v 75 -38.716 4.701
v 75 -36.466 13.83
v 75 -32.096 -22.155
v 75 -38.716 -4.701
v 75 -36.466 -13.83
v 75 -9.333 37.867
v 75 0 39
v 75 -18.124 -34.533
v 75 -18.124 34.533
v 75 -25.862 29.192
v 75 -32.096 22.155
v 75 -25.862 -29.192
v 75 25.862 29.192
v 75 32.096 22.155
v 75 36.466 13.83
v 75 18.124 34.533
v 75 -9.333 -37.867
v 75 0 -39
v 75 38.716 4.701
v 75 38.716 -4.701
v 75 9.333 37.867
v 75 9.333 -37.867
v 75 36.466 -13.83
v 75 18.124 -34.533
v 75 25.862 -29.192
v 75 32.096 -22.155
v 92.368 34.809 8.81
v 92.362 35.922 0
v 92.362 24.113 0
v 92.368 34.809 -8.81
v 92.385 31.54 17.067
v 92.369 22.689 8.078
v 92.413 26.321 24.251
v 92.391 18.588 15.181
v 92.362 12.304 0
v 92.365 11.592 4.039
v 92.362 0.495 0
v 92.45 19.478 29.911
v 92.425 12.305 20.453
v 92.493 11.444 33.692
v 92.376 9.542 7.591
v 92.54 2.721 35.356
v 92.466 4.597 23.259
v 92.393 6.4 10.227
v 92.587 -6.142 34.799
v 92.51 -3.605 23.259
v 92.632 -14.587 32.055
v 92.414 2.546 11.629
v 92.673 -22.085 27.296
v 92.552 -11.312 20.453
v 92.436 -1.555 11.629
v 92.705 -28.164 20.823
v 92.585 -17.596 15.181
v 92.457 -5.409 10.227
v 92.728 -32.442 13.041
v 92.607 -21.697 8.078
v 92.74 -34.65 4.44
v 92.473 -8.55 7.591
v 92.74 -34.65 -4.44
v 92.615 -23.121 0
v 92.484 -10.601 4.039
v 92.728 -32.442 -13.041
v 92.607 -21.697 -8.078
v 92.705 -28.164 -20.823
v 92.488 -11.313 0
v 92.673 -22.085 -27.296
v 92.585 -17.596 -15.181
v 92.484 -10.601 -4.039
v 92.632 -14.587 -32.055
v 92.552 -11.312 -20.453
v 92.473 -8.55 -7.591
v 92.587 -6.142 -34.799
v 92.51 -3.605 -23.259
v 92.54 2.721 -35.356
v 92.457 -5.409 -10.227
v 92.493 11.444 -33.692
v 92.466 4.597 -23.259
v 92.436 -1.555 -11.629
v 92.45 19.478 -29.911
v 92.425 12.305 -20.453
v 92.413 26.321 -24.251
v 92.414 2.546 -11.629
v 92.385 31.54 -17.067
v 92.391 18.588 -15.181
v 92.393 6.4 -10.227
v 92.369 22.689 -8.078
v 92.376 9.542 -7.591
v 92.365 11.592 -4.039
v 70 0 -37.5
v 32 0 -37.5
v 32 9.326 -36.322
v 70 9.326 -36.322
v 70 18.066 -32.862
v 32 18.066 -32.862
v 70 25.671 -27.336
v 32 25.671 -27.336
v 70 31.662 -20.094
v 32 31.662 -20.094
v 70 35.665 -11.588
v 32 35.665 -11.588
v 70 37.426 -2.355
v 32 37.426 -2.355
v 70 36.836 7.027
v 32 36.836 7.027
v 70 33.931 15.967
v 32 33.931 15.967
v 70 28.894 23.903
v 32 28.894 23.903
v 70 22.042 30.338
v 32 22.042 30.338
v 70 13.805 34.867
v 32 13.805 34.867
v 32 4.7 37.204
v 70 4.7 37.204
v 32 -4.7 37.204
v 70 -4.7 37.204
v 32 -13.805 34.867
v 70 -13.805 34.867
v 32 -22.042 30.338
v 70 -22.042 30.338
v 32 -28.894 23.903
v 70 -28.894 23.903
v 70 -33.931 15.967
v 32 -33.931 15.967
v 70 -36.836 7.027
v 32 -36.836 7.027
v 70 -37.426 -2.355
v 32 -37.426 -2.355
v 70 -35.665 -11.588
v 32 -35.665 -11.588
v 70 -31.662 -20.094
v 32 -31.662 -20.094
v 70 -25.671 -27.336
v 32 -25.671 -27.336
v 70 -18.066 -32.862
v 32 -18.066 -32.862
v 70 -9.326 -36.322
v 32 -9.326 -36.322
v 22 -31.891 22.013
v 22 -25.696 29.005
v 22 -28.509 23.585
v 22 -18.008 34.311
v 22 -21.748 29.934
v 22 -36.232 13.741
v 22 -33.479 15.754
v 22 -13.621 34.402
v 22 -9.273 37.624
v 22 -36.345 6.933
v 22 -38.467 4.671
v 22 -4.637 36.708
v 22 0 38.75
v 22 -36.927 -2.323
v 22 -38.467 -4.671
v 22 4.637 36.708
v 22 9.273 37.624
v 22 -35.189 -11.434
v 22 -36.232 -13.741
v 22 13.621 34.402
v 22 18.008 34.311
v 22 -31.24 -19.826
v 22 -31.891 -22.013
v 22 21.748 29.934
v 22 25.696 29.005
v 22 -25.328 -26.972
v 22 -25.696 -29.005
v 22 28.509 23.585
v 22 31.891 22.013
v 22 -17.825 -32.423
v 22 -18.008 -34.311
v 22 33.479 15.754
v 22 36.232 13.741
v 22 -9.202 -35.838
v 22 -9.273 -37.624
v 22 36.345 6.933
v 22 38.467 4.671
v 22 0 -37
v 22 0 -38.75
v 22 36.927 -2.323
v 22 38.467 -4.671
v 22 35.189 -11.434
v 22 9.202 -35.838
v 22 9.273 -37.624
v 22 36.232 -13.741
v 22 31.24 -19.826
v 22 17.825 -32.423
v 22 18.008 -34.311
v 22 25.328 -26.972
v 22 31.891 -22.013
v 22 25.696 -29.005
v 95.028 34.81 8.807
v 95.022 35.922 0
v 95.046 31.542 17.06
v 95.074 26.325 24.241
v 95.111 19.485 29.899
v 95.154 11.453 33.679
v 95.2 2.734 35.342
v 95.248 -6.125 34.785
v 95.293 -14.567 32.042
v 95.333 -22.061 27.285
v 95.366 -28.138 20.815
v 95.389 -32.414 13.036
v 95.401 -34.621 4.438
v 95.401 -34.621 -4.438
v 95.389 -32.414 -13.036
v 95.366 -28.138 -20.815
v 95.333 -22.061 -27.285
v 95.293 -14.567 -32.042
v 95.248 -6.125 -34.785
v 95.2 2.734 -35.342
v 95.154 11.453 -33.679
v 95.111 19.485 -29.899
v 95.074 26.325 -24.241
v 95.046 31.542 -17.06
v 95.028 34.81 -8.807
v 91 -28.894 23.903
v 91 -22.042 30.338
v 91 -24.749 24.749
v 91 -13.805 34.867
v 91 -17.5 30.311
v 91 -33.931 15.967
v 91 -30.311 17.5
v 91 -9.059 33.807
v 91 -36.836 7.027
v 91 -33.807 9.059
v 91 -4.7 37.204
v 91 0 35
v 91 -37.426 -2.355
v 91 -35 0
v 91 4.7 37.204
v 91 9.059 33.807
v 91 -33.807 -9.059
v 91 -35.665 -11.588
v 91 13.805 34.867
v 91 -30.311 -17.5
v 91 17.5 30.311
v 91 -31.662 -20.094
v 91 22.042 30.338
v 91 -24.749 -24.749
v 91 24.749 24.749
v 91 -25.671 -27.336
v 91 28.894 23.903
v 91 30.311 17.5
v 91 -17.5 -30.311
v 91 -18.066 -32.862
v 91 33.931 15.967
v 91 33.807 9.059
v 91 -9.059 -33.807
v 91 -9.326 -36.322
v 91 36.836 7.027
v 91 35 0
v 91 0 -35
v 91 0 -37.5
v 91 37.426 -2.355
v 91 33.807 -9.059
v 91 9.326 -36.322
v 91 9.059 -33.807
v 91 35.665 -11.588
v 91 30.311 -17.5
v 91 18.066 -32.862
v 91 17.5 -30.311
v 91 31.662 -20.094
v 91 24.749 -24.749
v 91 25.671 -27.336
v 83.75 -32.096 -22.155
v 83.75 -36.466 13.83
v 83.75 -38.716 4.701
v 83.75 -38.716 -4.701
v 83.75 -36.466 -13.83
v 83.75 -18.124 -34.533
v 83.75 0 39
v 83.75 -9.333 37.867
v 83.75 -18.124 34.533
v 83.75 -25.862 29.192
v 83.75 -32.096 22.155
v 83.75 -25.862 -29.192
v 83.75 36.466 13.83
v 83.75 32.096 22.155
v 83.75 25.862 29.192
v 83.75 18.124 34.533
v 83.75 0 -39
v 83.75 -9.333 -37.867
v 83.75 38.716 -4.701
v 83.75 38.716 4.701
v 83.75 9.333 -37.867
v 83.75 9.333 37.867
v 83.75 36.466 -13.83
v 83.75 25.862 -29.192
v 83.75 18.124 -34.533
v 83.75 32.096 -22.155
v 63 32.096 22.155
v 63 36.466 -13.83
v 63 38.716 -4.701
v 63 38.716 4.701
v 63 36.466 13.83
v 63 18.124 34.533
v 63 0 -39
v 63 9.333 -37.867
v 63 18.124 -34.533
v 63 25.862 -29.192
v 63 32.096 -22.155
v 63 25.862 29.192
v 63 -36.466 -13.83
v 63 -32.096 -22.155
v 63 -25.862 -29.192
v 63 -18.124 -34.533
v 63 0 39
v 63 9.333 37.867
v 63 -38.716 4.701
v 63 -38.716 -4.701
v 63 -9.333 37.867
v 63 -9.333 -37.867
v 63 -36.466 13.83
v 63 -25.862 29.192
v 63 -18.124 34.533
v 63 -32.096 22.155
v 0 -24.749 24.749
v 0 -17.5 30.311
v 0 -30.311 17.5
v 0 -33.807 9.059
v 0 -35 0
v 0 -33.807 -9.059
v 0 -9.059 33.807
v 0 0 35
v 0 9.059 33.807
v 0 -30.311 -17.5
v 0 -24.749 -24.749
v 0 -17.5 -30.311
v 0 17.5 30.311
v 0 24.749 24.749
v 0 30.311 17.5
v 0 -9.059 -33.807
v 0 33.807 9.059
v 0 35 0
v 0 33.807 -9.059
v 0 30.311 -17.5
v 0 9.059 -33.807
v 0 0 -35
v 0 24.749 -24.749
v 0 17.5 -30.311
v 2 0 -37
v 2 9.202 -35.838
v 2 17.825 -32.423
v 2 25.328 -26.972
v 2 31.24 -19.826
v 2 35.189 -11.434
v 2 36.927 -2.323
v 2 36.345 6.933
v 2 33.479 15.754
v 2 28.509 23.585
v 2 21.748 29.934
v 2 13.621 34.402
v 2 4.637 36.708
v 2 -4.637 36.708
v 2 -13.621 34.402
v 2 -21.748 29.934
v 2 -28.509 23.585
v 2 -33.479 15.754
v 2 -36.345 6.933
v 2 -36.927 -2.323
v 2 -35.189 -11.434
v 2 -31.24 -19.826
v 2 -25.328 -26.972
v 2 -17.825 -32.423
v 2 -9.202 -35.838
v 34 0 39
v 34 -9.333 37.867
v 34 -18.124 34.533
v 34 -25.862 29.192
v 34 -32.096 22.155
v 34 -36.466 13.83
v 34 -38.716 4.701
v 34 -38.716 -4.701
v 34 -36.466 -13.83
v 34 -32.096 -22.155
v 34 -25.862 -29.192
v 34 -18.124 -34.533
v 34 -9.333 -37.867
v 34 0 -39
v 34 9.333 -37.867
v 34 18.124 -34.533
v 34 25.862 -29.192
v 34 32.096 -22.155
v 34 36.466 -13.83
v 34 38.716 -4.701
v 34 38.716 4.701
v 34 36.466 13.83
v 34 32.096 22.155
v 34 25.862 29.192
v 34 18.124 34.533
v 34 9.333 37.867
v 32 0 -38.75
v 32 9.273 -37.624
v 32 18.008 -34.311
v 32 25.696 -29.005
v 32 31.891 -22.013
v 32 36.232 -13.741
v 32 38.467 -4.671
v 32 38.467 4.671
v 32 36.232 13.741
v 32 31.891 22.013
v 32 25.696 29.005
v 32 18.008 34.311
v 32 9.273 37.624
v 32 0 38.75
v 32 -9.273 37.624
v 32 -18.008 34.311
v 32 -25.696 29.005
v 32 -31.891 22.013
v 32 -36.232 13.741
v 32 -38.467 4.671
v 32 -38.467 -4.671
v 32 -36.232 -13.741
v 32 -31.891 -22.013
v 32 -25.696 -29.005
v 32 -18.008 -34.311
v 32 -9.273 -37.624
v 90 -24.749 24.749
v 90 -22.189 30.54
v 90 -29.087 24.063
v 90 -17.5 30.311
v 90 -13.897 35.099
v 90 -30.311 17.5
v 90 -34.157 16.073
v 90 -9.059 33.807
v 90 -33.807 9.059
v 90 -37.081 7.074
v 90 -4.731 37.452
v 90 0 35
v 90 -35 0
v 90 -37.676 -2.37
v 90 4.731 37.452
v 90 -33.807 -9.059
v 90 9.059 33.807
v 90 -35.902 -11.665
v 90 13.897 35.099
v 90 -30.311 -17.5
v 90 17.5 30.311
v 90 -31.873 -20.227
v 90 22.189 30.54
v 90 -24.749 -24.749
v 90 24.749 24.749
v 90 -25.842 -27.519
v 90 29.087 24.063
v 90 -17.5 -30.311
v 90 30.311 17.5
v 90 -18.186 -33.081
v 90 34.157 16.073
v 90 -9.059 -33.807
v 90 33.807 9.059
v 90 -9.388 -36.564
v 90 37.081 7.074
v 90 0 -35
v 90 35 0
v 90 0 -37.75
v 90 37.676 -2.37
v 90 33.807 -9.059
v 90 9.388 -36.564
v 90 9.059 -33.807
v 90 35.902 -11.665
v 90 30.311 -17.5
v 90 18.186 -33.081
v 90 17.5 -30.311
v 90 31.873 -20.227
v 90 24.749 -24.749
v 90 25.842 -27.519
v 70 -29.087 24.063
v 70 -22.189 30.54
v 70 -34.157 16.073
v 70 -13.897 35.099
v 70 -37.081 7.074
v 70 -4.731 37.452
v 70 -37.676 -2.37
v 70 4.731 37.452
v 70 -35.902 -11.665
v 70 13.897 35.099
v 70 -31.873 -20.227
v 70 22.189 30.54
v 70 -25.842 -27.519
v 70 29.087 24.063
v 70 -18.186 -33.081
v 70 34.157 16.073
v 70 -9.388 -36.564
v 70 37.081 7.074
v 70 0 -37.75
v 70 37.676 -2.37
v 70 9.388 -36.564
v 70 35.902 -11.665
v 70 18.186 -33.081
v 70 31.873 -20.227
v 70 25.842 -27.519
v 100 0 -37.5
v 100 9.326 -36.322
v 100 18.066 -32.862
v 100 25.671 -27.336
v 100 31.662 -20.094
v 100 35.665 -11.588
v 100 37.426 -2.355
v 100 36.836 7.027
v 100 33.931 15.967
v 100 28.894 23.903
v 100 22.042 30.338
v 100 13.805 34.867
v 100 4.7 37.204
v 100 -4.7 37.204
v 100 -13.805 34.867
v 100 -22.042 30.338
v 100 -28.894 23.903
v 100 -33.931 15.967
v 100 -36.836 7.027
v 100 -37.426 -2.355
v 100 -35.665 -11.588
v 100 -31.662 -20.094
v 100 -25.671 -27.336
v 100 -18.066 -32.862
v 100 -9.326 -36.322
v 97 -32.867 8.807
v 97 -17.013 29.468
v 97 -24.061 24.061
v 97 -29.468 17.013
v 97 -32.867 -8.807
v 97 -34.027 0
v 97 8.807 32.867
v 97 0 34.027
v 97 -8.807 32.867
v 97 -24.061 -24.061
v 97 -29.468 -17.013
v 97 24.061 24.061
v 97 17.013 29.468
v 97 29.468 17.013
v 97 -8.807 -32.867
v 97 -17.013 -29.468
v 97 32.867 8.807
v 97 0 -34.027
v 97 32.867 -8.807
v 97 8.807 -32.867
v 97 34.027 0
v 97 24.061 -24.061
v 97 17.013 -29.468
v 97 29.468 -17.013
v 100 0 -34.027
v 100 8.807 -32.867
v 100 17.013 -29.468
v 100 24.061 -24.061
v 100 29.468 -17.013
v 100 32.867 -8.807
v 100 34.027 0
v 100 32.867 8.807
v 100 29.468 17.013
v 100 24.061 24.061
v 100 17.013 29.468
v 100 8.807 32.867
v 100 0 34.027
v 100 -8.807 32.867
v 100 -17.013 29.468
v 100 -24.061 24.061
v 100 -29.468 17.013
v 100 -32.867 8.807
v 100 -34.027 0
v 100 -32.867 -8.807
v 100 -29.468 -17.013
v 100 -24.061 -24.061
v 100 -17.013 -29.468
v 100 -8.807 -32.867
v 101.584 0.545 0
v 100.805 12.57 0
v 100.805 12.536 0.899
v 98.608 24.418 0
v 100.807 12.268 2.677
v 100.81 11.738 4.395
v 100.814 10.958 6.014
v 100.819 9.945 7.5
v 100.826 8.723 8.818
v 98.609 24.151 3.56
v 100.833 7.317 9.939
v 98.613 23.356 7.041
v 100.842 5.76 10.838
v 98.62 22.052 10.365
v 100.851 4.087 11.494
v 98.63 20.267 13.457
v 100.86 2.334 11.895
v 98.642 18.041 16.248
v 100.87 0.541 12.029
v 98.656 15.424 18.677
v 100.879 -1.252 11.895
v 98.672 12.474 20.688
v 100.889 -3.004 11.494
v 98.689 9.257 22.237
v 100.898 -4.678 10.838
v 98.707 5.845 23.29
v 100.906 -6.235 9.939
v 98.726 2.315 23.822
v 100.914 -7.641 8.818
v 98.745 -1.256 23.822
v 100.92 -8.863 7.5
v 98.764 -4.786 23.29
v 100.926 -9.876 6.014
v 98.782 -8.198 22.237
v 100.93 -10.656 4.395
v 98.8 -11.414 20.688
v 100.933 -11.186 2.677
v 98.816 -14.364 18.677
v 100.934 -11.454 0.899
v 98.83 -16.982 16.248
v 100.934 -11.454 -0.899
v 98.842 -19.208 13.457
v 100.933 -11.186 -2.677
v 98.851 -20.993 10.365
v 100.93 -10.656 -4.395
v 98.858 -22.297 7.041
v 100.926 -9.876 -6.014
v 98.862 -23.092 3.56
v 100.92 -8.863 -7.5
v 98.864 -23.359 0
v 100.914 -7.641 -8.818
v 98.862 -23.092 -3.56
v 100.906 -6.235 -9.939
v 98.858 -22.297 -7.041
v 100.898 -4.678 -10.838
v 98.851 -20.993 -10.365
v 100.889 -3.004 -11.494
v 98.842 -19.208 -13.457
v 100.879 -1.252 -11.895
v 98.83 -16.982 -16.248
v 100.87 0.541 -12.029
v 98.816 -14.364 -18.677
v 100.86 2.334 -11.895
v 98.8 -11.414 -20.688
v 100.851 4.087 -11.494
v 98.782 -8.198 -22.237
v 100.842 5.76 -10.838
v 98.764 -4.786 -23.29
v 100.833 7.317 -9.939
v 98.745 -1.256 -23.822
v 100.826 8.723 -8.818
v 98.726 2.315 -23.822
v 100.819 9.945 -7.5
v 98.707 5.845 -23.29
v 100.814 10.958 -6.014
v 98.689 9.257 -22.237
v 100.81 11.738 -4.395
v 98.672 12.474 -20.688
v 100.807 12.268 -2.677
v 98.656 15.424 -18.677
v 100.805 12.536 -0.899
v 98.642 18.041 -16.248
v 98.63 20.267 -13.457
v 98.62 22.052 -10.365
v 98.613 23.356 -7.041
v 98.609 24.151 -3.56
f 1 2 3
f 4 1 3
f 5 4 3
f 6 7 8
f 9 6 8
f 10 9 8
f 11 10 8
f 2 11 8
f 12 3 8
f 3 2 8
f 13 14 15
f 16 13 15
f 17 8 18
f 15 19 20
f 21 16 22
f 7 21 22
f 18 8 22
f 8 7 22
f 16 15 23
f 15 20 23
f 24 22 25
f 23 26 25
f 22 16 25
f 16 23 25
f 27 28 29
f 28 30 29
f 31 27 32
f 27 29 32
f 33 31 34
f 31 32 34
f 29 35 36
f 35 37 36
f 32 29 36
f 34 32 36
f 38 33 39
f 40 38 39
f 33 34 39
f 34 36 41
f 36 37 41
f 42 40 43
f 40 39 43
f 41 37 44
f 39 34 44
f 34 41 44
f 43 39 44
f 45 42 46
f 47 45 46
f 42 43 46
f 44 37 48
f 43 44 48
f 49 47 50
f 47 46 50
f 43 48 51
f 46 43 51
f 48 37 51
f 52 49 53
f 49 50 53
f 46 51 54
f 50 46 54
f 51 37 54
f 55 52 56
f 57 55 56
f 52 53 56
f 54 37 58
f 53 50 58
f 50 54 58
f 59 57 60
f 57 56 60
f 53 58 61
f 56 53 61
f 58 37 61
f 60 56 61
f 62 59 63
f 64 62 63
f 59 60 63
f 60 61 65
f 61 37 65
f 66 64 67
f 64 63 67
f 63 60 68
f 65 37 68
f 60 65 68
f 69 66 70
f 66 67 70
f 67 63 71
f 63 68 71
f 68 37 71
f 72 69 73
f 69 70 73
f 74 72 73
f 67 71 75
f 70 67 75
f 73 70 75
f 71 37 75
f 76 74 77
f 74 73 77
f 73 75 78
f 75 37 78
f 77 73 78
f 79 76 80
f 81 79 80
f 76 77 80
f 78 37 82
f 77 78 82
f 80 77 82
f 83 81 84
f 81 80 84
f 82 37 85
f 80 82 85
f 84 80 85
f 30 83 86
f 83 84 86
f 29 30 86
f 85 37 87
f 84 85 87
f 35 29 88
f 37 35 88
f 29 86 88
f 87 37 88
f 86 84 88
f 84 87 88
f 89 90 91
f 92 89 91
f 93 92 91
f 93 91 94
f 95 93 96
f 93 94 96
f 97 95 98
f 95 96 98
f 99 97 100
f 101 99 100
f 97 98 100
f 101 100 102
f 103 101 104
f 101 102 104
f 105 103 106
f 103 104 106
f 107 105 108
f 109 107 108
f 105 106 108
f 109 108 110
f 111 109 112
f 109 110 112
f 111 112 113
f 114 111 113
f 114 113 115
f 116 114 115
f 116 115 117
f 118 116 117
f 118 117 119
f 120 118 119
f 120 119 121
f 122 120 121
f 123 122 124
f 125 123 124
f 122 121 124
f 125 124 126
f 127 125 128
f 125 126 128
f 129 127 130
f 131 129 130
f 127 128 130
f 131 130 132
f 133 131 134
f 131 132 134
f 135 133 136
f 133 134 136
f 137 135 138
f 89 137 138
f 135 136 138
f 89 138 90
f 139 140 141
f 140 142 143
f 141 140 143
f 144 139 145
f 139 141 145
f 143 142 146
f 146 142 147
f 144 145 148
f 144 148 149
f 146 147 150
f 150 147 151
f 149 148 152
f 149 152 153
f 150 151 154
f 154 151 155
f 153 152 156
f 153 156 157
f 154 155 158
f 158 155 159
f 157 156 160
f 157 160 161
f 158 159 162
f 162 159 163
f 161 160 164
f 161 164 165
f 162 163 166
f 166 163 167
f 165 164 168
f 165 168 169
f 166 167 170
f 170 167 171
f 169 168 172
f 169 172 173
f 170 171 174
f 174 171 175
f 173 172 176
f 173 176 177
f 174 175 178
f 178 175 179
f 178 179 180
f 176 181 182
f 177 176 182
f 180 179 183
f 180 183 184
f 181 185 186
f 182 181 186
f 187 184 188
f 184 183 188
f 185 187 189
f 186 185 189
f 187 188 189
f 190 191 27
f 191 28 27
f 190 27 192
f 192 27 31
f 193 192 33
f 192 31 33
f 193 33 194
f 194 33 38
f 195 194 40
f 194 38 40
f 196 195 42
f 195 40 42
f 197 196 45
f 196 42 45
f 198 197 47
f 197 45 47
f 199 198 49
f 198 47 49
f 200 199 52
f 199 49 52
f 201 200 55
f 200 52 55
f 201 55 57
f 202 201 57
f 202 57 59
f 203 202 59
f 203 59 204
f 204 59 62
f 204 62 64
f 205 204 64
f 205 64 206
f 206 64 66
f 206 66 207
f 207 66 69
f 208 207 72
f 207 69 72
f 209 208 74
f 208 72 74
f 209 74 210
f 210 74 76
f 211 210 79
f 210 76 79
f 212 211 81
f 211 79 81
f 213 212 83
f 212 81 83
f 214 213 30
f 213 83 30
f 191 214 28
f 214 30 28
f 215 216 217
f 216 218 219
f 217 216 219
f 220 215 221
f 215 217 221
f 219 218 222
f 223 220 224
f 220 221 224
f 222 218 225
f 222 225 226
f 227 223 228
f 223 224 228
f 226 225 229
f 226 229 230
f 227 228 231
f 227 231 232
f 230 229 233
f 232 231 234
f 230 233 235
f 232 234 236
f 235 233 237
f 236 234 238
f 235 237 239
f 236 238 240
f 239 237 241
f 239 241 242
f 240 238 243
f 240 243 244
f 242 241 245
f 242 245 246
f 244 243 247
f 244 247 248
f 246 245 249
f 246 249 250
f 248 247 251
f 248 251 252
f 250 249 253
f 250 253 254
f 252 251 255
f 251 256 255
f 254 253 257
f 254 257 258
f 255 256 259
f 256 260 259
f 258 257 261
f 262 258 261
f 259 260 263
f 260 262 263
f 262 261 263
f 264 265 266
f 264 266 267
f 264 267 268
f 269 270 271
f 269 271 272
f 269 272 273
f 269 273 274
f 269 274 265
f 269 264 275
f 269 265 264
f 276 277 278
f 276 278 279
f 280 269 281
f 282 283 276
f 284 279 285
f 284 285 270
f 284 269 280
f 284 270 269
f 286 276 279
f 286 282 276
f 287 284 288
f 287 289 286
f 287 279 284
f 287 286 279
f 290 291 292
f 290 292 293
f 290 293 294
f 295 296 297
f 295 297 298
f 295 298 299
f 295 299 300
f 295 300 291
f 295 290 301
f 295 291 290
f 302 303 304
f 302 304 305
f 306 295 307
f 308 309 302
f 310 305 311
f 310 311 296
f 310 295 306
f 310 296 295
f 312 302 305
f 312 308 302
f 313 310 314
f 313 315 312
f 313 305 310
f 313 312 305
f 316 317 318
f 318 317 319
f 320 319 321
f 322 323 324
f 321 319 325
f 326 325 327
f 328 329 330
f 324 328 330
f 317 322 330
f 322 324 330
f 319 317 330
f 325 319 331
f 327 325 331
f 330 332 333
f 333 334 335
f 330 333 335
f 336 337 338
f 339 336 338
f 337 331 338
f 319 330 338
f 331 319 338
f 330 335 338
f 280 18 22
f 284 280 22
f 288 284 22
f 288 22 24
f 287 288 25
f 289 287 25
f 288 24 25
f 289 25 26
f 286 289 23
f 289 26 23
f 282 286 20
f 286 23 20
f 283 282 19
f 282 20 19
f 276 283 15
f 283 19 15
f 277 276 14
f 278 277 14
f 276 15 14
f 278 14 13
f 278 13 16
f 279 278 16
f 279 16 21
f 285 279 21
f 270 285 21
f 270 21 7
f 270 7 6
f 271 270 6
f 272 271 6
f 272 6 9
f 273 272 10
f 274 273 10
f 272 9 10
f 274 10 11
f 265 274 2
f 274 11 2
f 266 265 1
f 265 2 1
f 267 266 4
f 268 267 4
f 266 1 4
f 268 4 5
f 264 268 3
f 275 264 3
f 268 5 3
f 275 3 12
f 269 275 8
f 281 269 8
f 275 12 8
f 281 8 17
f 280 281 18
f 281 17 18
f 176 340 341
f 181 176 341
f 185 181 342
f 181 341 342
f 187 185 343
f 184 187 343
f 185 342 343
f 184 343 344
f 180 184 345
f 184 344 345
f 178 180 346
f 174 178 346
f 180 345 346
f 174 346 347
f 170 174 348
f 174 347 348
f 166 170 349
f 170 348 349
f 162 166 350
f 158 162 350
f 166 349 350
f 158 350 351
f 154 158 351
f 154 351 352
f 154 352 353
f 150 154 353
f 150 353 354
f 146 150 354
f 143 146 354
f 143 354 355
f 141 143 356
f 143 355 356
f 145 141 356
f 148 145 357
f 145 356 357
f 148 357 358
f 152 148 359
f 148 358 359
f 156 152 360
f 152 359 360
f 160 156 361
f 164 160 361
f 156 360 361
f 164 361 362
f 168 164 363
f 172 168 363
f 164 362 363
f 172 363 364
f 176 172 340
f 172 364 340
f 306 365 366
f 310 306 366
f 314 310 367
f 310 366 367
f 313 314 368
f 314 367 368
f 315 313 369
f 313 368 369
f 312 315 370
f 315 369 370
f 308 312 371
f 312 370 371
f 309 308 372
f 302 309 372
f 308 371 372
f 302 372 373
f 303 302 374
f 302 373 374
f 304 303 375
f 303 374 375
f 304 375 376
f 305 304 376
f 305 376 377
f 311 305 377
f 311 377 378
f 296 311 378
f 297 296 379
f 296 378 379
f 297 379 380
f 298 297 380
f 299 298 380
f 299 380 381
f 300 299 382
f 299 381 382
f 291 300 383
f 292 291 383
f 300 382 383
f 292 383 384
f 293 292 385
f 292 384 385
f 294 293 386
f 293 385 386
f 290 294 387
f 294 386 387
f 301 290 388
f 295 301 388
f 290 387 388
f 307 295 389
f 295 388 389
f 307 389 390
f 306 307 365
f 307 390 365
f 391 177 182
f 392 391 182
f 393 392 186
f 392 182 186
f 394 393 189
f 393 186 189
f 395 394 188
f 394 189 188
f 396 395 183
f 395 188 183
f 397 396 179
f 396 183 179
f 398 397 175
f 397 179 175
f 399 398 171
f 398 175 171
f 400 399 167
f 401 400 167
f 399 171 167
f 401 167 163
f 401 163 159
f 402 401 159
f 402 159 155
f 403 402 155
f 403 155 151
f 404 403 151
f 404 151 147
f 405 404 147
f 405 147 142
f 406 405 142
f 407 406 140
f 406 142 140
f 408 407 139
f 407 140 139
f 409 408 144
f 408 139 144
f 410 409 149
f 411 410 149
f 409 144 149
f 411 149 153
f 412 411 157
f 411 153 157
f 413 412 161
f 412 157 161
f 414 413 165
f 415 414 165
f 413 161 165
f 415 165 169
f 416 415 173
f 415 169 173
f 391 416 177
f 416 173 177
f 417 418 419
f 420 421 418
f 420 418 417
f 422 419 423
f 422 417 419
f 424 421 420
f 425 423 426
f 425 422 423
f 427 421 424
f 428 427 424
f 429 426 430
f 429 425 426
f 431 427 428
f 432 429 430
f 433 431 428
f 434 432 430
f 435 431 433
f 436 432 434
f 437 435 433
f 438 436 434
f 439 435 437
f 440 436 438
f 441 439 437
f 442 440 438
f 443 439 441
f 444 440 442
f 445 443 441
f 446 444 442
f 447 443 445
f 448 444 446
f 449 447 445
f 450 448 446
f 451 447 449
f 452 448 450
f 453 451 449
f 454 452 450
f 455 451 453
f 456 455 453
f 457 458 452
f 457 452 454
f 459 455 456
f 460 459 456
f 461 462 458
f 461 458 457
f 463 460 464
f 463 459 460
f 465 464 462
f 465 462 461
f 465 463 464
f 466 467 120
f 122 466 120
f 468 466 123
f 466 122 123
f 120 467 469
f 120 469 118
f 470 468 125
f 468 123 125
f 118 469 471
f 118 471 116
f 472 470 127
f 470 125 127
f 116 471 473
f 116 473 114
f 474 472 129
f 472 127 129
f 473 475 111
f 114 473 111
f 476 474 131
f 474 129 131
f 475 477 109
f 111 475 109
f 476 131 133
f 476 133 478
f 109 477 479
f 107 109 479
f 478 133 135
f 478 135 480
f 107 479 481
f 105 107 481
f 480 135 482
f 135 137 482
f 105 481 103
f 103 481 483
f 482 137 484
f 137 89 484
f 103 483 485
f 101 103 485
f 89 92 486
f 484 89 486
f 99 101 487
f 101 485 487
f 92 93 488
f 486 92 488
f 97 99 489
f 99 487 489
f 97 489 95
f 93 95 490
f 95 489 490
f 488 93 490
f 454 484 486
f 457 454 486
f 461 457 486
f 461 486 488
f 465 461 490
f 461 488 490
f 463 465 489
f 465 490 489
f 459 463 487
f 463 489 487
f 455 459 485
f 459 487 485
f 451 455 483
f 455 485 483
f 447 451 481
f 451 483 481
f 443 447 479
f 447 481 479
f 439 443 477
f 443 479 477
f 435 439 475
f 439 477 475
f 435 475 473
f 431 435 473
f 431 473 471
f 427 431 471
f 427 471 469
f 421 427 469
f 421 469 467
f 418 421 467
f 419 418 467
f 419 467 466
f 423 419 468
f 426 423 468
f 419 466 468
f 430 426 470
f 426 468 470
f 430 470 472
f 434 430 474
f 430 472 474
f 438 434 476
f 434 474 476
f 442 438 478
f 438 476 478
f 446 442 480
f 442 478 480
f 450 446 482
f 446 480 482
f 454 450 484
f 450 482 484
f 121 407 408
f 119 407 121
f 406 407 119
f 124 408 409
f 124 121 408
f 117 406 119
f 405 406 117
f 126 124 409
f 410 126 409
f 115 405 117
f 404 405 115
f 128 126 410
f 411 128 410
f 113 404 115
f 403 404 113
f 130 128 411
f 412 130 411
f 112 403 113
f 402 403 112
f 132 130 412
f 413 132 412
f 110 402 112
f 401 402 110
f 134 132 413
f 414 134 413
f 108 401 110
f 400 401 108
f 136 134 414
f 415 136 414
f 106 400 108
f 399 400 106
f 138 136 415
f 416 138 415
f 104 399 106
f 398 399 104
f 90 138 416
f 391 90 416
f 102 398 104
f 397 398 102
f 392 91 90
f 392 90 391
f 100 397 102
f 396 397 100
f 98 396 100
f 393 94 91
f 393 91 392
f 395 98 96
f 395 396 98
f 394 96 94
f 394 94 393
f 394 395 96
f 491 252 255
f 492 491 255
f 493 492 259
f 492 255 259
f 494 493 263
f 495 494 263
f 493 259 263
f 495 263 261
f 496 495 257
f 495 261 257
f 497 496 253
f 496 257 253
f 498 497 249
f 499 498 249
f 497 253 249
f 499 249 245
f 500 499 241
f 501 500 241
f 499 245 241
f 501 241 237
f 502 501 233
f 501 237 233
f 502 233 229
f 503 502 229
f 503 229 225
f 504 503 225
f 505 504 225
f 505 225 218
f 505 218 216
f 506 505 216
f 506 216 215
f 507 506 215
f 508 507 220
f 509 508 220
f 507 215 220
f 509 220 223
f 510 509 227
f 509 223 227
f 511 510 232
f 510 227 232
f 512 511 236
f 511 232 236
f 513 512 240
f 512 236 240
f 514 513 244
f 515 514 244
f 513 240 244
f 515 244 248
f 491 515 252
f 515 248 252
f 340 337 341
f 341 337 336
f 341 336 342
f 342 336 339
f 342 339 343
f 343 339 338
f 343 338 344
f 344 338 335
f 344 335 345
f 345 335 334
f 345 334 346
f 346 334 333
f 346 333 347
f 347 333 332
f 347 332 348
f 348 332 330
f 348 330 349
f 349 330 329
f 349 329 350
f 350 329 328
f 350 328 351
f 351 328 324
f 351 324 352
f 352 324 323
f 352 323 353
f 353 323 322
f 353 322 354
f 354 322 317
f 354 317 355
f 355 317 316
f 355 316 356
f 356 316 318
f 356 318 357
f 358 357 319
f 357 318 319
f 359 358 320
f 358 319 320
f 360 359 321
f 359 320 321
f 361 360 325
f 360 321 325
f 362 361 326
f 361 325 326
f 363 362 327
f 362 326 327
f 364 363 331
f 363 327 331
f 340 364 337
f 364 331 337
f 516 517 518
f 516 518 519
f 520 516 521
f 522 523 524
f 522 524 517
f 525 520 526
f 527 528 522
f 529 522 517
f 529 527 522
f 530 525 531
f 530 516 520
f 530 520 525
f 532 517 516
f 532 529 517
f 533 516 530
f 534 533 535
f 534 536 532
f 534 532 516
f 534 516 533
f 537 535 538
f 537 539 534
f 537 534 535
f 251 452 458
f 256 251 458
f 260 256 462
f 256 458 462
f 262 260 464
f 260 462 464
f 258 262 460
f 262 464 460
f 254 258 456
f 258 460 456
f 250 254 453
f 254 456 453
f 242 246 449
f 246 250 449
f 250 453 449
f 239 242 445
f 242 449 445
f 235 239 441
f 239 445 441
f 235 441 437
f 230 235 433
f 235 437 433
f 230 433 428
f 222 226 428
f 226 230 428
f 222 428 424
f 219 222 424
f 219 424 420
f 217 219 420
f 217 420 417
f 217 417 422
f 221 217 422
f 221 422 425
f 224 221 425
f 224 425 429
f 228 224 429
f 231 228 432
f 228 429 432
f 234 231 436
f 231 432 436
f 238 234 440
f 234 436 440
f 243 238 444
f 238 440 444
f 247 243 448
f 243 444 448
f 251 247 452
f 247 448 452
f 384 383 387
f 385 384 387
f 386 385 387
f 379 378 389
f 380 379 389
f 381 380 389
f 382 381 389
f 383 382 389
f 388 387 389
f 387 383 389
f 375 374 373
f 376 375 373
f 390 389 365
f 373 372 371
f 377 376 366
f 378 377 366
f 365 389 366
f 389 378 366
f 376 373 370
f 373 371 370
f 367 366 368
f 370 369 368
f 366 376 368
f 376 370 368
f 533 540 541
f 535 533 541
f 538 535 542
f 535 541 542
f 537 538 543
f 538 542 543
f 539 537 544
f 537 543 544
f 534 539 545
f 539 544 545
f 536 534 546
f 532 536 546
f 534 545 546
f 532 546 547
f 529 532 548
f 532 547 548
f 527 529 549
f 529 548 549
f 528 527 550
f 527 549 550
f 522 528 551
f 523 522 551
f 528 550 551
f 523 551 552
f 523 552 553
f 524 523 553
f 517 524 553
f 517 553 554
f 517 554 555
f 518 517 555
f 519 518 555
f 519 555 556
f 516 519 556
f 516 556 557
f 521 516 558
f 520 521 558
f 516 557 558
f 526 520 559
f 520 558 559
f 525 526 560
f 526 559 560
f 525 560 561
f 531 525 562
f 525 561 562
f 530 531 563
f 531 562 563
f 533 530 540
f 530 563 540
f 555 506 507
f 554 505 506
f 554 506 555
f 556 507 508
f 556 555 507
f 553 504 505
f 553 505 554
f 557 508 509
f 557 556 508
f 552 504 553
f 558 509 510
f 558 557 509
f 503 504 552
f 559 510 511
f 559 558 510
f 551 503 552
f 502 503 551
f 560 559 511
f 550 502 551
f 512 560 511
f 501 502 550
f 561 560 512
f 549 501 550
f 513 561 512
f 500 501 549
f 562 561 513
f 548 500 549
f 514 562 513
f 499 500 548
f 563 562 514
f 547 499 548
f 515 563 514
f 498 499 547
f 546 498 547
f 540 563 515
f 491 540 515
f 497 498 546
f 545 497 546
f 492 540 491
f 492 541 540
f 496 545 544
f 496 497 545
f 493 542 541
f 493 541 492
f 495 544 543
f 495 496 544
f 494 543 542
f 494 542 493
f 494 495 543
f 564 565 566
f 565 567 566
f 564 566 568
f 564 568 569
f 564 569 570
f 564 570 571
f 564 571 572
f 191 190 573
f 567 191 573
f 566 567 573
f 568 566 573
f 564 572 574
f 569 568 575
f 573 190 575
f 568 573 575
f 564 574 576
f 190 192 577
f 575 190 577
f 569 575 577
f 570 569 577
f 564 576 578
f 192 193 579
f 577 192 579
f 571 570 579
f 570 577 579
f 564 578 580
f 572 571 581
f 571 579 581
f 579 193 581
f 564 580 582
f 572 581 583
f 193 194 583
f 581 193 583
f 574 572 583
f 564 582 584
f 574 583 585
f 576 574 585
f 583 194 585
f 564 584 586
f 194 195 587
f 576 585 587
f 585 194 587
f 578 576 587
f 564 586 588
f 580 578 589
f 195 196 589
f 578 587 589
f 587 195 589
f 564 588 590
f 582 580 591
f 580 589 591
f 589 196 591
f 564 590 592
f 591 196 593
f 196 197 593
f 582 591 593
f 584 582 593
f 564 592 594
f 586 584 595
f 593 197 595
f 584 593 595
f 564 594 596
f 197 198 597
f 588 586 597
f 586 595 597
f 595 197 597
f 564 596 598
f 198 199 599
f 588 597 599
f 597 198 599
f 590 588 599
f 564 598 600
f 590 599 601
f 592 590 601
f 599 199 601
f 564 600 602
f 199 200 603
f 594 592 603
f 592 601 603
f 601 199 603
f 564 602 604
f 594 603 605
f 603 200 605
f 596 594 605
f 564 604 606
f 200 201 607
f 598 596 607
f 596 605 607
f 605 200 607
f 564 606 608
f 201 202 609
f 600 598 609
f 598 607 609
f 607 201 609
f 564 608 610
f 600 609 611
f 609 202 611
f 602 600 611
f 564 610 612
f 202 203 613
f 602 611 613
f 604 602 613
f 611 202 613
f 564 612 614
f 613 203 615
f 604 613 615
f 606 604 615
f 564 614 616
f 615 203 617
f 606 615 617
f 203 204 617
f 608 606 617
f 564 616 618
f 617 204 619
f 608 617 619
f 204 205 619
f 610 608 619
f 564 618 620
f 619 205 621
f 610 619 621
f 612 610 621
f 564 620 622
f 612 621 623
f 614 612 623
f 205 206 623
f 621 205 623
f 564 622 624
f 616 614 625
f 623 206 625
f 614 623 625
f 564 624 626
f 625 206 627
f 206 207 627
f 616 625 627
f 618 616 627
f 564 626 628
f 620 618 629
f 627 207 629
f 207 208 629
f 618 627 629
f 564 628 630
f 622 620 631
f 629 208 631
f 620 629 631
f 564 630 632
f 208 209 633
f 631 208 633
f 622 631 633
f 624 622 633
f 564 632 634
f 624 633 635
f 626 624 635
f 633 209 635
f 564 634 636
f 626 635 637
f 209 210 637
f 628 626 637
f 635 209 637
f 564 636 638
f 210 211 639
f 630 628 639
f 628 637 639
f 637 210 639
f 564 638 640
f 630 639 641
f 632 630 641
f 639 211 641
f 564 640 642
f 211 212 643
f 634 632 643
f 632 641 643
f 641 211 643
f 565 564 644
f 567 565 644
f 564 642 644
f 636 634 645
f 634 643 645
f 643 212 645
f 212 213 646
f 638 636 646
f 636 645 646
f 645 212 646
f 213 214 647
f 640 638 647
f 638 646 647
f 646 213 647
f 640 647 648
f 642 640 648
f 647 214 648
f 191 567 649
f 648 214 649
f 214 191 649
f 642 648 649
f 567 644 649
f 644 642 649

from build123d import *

# Parameters (mm, degrees)
SKETCH1_R           = 37
BOSS_EXTRUDE1_DEPTH = 22
SKETCH2_R           = 38.75
BOSS_EXTRUDE2_DEPTH = 10
SKETCH3_R           = 37.5
BOSS_EXTRUDE3_DEPTH = 38
BOSS_EXTRUDE4_START = 34
SKETCH4_R           = 39
BOSS_EXTRUDE4_DEPTH = 29
BOSS_EXTRUDE6_START = 70
SKETCH7_R           = 37.75
BOSS_EXTRUDE6_DEPTH = 20
BOSS_EXTRUDE5_START = 75
SKETCH5_R           = 39
BOSS_EXTRUDE5_DEPTH = 8.75
SKETCH8_R           = 35
BOSS_EXTRUDE7_DEPTH = 3
BOSS_EXTRUDE8_START = 91
SKETCH10_R          = 37.5
BOSS_EXTRUDE8_DEPTH = 9
CHAMFER1_SIZE       = 2
SKETCH11_R          = 34.026825553
CUT_EXTRUDE1_DEPTH  = 3


with BuildPart() as part:
    # Sketch1 → Boss-Extrude1 (new body)
    with BuildSketch(Plane(origin=(0, 0, 0), x_dir=(0, 0, -1), z_dir=(1, 0, 0))):
        Circle(SKETCH1_R)
    extrude(amount=BOSS_EXTRUDE1_DEPTH)

    # Sketch2 → Boss-Extrude2 (add)
    with BuildSketch(Plane(origin=(22, 0, 0), x_dir=(0, 0, -1), z_dir=(1, 0, 0))):
        Circle(SKETCH2_R)
    extrude(amount=BOSS_EXTRUDE2_DEPTH)

    # Sketch3 → Boss-Extrude3 (add)
    with BuildSketch(Plane(origin=(32, 0, 0), x_dir=(0, 0, -1), z_dir=(1, 0, 0))):
        Circle(SKETCH3_R)
    extrude(amount=BOSS_EXTRUDE3_DEPTH)

    # Sketch7 → Boss-Extrude6 (add)
    with BuildSketch(Plane(origin=(0, 0, 0), x_dir=(0, 0, -1), z_dir=(1, 0, 0)).offset(BOSS_EXTRUDE6_START)):
        Circle(SKETCH7_R)
    extrude(amount=BOSS_EXTRUDE6_DEPTH)

    # Sketch8 → Boss-Extrude7 (add)
    with BuildSketch(Plane(origin=(90, 0, 0), x_dir=(0, 0, -1), z_dir=(1, 0, 0))):
        Circle(SKETCH8_R)
    extrude(amount=BOSS_EXTRUDE7_DEPTH)

    # Sketch10 → Boss-Extrude8 (add)
    with BuildSketch(Plane(origin=(0, 0, 0), x_dir=(0, 0, -1), z_dir=(1, 0, 0)).offset(BOSS_EXTRUDE8_START)):
        Circle(SKETCH10_R)
    extrude(amount=BOSS_EXTRUDE8_DEPTH)

    # Chamfer1
    chamfer1_edges = [part.edges().sort_by_distance(p)[0] for p in [
        (0, 0, 37),
    ]]
    chamfer(chamfer1_edges, length=CHAMFER1_SIZE)

    # Sketch11 → Cut-Extrude1 (cut)
    with BuildSketch(Plane(origin=(100, 0, 0), x_dir=(0, 0, -1), z_dir=(1, 0, 0))):
        Circle(SKETCH11_R)
    extrude(amount=-CUT_EXTRUDE1_DEPTH, mode=Mode.SUBTRACT)


with BuildPart() as body_2:
    # Sketch4 → Boss-Extrude4 (new body)
    with BuildSketch(Plane(origin=(0, 0, 0), x_dir=(0, 0, -1), z_dir=(1, 0, 0)).offset(BOSS_EXTRUDE4_START)):
        with Locations(Location((0, 0, 0), (0, 0, 180))):
            Circle(SKETCH4_R)
    extrude(amount=BOSS_EXTRUDE4_DEPTH)


with BuildPart() as body_3:
    # Sketch5 → Boss-Extrude5 (new body)
    with BuildSketch(Plane(origin=(0, 0, 0), x_dir=(0, 0, -1), z_dir=(1, 0, 0)).offset(BOSS_EXTRUDE5_START)):
        Circle(SKETCH5_R)
    extrude(amount=BOSS_EXTRUDE5_DEPTH)


with BuildPart() as body_4:
    # Sketch12 → Revolve2 (revolve)
    with BuildSketch(Plane.XY):
        with BuildLine():
            Line((95.022451355, 35.922168635), (92.361549975, 35.922168635))
            Line((92.361549975, 35.922168635), (92.361549975, 0.495430445))
            Line((92.361549975, 0.495430445), (101.584307564, 0.544901625))
            ThreePointArc((101.584307564, 0.544901625), (99.882141389, 18.526367495), (95.022451355, 35.922168635))
        make_face()
    revolve(axis=Axis((0, 0, 0), (0.999985613882951, 0.005363956295271656, 0)))


solid = Compound([part.part, body_2.part, body_3.part, body_4.part])
